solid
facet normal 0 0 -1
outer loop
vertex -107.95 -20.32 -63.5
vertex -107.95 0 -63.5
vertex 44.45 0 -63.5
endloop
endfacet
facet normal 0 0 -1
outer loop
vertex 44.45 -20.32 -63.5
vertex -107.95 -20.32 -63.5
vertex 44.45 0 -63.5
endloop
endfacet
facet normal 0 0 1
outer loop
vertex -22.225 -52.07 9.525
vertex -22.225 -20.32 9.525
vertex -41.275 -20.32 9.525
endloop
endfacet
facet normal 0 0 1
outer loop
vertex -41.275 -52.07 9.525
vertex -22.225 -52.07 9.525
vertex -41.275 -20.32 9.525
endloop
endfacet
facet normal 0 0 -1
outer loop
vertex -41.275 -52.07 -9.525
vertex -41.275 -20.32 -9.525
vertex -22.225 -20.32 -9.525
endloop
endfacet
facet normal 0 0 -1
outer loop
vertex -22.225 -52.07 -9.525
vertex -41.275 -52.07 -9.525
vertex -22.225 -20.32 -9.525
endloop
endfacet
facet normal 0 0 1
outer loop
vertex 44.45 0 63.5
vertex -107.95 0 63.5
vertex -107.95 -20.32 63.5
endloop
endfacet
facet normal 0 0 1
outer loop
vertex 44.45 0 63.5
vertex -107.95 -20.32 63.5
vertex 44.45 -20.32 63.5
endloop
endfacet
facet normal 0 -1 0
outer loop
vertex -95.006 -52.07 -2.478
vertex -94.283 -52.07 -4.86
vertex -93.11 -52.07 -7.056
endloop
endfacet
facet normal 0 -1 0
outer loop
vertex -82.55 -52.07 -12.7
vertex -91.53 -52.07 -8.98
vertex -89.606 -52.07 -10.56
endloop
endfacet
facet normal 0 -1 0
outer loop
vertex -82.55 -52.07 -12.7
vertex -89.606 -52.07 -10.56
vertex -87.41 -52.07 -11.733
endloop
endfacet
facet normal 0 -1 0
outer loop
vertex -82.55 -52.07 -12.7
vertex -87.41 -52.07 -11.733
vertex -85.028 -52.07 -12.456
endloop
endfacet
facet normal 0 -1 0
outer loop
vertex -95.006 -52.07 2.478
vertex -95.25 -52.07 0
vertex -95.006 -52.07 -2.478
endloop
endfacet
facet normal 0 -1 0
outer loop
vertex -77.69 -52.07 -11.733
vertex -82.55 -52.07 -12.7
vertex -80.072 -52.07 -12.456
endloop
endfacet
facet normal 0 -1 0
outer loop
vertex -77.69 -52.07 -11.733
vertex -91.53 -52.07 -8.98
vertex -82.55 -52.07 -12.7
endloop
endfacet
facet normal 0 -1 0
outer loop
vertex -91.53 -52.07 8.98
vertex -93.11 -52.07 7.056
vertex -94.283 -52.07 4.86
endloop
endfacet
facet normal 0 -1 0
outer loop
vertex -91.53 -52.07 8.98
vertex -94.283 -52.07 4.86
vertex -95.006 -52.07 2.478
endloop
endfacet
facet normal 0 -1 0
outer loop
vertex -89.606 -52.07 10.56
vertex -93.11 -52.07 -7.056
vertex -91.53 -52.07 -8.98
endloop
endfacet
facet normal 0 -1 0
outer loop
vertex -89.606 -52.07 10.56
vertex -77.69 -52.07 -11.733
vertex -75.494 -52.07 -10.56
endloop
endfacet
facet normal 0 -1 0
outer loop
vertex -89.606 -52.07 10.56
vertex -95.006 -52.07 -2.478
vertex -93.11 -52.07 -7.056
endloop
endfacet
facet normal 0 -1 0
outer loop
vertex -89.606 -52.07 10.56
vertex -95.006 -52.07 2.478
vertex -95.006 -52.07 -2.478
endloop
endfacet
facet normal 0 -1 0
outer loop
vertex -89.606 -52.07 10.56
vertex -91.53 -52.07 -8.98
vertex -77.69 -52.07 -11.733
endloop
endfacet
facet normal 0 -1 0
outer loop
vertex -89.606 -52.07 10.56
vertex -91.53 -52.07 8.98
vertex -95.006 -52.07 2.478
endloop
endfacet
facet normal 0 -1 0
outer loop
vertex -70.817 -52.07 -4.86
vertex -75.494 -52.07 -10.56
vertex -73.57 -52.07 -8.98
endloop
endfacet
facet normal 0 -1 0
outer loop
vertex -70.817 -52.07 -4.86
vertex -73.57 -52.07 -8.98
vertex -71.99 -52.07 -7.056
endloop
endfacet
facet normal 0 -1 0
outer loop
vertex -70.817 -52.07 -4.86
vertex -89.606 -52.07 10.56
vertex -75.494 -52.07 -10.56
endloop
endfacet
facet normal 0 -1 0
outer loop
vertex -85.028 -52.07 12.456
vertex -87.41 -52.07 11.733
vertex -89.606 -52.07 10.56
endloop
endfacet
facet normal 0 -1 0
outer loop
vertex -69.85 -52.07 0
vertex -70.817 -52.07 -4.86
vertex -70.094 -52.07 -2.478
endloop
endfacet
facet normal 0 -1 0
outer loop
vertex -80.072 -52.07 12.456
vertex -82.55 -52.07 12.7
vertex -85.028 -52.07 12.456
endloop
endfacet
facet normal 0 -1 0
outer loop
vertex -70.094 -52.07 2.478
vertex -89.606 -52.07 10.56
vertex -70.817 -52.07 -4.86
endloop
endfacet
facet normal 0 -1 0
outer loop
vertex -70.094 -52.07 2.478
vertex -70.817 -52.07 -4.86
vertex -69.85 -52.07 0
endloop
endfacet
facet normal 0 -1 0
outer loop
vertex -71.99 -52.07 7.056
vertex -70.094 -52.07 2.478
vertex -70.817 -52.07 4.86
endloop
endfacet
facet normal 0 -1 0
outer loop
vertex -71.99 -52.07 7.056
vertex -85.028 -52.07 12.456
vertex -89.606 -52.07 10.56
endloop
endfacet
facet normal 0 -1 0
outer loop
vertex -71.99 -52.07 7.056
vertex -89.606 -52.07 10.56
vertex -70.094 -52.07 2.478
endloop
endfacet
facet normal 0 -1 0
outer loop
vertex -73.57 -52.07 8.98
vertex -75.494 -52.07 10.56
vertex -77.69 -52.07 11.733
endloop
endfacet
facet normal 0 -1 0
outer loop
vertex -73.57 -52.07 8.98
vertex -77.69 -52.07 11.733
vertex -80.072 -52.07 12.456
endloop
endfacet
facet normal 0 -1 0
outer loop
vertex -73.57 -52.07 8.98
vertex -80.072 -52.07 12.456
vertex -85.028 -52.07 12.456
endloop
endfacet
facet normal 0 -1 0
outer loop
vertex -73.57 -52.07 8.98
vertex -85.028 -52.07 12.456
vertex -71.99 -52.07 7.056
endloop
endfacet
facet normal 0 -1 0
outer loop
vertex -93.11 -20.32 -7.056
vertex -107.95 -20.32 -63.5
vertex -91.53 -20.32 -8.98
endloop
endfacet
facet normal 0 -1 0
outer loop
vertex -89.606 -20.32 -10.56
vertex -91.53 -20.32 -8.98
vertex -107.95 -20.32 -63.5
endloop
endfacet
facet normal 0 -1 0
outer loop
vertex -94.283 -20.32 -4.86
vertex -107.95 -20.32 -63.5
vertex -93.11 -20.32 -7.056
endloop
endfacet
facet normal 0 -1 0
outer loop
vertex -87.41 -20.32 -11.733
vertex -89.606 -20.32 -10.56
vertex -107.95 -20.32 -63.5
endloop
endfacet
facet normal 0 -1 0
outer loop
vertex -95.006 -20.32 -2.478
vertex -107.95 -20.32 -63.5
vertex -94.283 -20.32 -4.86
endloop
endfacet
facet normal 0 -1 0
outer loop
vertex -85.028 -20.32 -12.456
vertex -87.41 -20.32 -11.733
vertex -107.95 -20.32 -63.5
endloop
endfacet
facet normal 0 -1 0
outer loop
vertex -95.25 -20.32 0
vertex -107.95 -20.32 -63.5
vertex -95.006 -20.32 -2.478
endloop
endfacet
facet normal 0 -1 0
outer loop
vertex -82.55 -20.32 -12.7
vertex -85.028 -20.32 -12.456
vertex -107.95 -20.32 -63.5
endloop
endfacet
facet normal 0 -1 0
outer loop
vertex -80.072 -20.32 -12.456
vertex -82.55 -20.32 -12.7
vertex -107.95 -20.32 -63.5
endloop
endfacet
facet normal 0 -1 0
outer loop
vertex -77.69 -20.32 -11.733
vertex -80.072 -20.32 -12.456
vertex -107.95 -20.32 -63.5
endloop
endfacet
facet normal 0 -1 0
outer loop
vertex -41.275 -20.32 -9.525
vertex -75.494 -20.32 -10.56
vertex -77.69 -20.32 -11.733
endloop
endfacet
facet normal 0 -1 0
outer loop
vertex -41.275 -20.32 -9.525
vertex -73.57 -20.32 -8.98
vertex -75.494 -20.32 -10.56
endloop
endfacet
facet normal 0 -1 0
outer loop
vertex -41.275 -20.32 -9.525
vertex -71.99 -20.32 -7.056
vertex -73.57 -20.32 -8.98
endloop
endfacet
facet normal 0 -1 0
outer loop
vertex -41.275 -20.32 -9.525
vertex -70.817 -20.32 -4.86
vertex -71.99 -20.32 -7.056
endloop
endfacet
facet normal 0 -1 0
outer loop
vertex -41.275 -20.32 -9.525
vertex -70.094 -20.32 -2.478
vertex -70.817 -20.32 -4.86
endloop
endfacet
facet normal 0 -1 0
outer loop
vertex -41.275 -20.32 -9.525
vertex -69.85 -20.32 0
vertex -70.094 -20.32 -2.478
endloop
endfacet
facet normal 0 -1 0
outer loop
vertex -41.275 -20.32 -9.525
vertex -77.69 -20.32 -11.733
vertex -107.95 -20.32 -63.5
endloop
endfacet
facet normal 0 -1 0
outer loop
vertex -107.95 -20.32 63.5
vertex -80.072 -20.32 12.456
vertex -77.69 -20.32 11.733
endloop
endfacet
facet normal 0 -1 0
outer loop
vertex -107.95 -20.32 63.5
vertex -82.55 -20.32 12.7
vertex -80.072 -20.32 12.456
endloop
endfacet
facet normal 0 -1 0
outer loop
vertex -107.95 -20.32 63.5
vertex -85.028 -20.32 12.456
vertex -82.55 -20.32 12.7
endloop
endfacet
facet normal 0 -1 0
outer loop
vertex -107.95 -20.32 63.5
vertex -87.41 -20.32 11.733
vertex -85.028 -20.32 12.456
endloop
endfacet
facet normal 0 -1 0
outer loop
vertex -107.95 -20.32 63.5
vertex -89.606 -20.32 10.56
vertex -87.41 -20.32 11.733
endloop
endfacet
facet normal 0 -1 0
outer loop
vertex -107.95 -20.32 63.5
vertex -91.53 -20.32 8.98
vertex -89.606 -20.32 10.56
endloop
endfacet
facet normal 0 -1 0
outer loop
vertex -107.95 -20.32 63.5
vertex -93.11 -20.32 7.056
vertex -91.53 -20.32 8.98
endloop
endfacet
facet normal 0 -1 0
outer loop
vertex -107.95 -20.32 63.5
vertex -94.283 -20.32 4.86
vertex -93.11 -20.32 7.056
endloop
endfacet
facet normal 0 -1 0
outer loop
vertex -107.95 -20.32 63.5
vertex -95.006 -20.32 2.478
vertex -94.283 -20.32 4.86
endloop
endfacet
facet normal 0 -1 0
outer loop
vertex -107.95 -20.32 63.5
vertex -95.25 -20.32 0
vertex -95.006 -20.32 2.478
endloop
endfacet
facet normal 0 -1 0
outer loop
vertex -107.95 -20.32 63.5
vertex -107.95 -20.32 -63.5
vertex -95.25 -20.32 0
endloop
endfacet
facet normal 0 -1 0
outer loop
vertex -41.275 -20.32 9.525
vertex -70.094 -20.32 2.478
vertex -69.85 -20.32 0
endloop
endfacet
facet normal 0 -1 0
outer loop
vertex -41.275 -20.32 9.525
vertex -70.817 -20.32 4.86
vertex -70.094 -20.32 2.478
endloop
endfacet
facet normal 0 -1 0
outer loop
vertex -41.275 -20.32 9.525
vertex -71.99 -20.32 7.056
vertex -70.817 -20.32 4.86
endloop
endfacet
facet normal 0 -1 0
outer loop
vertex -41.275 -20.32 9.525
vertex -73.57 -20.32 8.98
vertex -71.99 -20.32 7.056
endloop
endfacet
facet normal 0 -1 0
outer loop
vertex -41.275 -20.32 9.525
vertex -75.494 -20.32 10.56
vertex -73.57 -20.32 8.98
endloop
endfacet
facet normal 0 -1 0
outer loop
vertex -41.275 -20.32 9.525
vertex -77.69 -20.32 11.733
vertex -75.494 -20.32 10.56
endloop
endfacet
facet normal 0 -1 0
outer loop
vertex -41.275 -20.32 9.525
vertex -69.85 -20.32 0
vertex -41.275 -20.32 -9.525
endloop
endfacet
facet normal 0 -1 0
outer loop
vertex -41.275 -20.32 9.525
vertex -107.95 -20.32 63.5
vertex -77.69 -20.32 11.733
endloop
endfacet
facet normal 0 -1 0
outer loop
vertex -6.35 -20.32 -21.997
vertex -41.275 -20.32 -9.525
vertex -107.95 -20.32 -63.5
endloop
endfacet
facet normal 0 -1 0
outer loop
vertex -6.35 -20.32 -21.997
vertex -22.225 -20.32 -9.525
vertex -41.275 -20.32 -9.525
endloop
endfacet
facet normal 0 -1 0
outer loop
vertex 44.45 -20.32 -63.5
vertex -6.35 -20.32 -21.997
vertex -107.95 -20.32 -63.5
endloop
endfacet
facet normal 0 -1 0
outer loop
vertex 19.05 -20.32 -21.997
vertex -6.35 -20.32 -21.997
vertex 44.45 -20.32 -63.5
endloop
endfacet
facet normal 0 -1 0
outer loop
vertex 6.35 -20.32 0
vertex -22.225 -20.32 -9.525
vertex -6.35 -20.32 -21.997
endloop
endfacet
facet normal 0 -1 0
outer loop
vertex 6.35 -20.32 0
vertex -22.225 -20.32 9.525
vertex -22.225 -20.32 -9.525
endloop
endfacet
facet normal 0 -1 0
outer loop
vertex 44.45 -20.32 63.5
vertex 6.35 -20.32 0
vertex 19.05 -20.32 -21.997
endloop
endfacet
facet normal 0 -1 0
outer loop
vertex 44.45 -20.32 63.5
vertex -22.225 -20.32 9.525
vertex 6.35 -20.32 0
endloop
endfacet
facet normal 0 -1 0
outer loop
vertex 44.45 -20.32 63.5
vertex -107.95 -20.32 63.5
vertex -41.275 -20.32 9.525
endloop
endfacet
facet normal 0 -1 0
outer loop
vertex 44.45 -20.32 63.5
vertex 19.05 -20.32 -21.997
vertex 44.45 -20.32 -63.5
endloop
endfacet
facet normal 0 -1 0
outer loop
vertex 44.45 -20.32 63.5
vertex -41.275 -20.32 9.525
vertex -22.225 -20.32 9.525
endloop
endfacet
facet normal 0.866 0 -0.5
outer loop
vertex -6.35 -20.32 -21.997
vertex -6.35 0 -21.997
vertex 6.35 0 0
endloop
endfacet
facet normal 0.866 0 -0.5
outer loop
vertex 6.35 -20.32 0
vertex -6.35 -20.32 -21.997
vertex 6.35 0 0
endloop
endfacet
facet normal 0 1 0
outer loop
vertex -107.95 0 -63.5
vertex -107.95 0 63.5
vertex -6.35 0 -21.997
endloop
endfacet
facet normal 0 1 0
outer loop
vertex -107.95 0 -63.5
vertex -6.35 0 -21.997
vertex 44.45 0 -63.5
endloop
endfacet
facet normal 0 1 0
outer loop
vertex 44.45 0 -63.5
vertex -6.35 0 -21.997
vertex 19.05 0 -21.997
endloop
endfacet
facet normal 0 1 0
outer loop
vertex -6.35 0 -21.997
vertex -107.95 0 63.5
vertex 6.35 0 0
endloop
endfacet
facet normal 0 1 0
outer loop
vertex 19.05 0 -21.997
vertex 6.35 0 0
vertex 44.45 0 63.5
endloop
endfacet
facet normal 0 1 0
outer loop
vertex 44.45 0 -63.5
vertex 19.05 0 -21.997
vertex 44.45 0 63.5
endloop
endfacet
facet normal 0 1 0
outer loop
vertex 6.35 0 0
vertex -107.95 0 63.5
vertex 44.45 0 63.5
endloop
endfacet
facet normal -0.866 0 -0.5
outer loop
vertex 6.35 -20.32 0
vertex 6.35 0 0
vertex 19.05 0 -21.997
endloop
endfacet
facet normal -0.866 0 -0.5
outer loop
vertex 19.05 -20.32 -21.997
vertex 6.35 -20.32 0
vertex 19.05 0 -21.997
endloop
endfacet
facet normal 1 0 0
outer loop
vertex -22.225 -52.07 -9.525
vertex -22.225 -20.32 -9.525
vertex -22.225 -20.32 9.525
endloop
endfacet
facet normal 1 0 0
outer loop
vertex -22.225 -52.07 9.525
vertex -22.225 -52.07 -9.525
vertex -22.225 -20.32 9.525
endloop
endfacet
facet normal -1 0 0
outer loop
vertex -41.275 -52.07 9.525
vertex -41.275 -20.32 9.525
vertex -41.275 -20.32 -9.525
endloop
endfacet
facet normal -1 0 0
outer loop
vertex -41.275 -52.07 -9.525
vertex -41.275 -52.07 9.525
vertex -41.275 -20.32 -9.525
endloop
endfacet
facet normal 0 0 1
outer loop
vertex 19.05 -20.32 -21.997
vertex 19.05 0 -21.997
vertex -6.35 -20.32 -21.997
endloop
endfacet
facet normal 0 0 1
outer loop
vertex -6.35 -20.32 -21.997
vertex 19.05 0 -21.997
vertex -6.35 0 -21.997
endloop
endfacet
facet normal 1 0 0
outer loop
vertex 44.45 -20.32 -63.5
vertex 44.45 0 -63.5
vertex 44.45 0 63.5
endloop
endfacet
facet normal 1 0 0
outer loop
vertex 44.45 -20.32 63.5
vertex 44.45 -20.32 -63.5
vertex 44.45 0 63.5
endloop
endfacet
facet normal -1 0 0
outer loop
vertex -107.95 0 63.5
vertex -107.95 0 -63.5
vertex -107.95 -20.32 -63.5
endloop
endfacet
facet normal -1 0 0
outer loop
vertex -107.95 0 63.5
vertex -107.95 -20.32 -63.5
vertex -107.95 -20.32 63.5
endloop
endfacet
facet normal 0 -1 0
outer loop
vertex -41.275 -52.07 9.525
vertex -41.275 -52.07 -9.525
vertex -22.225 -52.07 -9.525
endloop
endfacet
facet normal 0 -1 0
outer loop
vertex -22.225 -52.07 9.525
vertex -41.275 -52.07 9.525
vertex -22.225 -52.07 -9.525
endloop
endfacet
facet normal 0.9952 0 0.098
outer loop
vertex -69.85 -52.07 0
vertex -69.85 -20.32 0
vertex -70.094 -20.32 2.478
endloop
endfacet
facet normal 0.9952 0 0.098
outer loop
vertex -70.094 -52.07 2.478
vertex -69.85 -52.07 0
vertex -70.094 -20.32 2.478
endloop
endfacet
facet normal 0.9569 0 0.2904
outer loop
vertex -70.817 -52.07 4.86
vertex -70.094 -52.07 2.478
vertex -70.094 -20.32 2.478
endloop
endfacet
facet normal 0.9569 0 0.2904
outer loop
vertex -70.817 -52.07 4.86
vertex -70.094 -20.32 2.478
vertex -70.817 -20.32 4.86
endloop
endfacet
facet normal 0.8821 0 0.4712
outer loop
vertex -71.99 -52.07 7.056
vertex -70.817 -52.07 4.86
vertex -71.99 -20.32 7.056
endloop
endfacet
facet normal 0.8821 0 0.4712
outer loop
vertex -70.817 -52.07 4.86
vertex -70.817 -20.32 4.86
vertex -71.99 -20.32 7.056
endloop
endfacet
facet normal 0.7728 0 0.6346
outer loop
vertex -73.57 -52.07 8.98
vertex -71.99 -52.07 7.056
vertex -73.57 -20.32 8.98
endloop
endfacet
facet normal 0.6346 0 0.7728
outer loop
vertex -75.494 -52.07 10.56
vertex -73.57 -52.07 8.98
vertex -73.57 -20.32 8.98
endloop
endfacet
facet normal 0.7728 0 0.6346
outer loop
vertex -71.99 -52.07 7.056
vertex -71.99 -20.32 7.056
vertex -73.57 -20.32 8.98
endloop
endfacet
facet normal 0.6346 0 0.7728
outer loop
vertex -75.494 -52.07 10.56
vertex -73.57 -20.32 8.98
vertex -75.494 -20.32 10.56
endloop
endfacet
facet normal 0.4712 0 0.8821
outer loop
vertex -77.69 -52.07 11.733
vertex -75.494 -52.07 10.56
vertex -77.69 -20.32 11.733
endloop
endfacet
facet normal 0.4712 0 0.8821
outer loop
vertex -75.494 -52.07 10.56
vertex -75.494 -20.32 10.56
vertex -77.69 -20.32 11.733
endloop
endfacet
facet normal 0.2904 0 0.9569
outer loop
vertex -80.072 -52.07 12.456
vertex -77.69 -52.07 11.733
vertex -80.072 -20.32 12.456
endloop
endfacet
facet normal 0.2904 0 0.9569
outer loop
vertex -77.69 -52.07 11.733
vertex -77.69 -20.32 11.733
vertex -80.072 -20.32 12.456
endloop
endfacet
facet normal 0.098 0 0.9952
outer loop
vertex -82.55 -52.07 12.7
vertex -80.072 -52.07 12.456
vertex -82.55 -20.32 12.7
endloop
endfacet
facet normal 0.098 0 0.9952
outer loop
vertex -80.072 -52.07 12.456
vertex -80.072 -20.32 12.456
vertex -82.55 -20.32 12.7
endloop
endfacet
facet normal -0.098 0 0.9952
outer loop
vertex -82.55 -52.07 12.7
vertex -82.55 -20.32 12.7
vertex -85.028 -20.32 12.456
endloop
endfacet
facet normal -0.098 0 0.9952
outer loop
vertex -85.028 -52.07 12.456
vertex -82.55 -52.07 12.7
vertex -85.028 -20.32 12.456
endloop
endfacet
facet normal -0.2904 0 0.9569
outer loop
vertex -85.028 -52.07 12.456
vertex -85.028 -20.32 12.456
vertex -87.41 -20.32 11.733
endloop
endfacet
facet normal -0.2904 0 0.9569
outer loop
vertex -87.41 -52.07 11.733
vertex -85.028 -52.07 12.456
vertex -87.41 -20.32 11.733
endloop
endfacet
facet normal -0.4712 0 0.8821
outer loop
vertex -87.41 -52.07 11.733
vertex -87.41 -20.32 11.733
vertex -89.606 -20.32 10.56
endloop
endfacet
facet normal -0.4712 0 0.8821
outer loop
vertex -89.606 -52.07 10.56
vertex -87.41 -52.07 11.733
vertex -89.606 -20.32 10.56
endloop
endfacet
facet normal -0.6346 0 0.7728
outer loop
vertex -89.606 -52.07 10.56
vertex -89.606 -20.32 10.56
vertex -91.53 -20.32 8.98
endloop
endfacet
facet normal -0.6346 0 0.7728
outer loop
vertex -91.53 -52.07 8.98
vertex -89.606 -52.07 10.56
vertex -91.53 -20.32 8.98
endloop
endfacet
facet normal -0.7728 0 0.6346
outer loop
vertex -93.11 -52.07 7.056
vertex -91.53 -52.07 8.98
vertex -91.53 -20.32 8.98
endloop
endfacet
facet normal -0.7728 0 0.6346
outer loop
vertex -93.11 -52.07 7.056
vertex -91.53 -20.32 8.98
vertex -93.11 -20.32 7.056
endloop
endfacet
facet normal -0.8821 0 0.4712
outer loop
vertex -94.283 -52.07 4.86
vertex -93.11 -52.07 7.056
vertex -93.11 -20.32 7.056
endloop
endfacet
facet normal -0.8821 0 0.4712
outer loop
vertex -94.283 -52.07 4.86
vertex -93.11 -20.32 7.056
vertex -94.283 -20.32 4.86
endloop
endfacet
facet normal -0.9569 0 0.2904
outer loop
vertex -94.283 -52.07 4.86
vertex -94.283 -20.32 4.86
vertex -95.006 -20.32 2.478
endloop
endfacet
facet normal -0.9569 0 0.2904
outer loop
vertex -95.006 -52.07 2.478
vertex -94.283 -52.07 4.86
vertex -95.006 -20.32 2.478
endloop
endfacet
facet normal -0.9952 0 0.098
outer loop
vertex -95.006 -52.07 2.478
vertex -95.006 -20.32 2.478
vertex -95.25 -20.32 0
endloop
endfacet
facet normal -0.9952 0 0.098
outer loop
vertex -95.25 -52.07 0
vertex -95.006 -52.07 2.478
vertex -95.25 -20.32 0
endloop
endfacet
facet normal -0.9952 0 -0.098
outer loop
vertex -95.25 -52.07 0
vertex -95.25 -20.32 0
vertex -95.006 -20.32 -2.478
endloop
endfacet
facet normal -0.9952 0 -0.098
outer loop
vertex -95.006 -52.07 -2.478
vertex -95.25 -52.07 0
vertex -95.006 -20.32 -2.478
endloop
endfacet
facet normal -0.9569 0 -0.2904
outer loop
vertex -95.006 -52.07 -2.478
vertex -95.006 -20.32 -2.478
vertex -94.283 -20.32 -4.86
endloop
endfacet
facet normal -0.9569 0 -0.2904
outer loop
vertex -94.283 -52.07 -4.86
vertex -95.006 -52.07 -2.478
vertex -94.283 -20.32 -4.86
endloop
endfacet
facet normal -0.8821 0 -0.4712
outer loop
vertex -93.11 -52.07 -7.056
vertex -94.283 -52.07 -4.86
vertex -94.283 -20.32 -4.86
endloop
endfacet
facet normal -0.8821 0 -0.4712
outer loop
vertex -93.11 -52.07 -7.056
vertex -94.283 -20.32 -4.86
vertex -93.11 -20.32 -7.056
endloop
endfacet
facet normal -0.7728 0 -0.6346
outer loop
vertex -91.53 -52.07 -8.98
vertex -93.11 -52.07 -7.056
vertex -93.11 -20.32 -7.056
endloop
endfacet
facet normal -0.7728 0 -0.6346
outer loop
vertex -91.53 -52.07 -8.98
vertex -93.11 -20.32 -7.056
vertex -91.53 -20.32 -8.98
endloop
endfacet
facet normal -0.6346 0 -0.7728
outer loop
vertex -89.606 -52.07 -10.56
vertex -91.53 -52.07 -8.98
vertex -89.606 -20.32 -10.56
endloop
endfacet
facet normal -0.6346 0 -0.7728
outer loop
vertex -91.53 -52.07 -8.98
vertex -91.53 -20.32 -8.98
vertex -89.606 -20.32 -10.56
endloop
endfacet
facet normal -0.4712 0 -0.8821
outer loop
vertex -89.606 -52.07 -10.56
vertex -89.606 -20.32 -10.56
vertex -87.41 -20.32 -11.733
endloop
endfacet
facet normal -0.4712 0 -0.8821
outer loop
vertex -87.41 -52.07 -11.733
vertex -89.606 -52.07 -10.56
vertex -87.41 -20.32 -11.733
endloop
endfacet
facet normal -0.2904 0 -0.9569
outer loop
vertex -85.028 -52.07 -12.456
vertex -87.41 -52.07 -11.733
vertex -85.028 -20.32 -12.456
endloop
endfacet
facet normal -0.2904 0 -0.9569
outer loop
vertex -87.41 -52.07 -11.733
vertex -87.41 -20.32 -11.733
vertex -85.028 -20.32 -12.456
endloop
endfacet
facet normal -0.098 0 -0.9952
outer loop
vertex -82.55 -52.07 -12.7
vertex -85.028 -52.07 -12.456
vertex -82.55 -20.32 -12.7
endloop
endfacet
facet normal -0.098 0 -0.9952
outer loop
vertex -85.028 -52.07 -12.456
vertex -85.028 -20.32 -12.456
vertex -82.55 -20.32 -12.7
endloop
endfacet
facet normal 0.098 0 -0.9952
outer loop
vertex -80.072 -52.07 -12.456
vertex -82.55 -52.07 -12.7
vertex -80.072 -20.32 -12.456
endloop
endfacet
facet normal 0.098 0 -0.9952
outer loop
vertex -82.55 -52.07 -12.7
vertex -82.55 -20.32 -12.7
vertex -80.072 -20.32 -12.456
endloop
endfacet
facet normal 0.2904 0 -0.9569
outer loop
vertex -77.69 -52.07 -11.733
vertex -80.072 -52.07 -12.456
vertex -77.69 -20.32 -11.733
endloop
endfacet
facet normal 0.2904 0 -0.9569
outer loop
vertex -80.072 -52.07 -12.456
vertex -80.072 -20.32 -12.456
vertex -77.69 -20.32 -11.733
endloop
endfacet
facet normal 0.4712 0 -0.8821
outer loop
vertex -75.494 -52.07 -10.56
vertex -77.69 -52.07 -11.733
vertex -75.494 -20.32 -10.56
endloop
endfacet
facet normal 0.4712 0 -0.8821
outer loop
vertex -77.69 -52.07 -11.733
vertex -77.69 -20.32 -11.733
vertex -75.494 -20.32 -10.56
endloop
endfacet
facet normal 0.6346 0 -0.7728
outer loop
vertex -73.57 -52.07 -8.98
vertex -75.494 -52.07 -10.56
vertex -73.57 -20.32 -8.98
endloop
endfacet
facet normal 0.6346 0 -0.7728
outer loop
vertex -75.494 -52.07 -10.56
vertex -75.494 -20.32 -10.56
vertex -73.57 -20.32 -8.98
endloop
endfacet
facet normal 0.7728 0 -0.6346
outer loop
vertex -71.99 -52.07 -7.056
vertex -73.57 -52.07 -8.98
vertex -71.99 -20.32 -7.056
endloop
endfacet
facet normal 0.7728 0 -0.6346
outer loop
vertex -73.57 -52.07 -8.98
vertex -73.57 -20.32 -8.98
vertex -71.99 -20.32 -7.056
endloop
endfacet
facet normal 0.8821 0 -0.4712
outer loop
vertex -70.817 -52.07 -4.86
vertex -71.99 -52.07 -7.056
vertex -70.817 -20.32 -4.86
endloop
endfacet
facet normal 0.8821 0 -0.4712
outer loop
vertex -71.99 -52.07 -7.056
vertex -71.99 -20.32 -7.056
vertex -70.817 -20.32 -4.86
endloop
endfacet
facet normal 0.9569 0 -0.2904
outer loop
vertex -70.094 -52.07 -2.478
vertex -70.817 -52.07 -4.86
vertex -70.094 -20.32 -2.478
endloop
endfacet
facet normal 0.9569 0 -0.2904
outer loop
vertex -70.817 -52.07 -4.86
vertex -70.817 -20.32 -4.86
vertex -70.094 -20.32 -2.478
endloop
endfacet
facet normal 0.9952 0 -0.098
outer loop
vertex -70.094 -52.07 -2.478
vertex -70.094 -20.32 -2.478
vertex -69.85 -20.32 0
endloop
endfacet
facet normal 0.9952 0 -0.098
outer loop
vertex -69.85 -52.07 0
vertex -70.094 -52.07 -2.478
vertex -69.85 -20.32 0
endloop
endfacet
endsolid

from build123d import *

# Parameters (mm, degrees)
F0_W     = 152.4
F0_H     = 127
F0_R     = 12.7
F1_DEPTH = 20.32
F2_DEPTH = 52.07
F3_DEPTH = 52.07


with BuildPart() as f1:
    # F0 (on Front) → F1 (new body)
    with BuildSketch(Plane.XZ):
        with Locations((-31.75, 0)):
            Rectangle(F0_W, F0_H)
        Polygon((-6.35, -21.997045), (6.35, 0), (19.05, -21.997045), align=None, mode=Mode.SUBTRACT)
        with Locations((-82.55, 0)):
            Circle(F0_R, mode=Mode.SUBTRACT)
        Polygon((-22.225, 9.525), (-22.225, 0), (-22.225, -9.525), (-41.275, -9.525), (-41.275, 0), (-41.275, 9.525), align=None, mode=Mode.SUBTRACT)
    extrude(amount=F1_DEPTH)

    # F0 (on Front) → F2 (join)
    with BuildSketch(Plane.XZ):
        with Locations((-82.55, 0)):
            Circle(F0_R)
    extrude(amount=F2_DEPTH)

    # F0 (on Front) → F3 (join)
    with BuildSketch(Plane.XZ):
        Polygon((-22.225, -9.525), (-22.225, 0), (-31.75, 0), (-41.275, 0), (-41.275, -9.525), align=None)
        Polygon((-31.75, 0), (-22.225, 0), (-22.225, 9.525), (-41.275, 9.525), (-41.275, 0), align=None)
    extrude(amount=F3_DEPTH)


solid = f1.part
